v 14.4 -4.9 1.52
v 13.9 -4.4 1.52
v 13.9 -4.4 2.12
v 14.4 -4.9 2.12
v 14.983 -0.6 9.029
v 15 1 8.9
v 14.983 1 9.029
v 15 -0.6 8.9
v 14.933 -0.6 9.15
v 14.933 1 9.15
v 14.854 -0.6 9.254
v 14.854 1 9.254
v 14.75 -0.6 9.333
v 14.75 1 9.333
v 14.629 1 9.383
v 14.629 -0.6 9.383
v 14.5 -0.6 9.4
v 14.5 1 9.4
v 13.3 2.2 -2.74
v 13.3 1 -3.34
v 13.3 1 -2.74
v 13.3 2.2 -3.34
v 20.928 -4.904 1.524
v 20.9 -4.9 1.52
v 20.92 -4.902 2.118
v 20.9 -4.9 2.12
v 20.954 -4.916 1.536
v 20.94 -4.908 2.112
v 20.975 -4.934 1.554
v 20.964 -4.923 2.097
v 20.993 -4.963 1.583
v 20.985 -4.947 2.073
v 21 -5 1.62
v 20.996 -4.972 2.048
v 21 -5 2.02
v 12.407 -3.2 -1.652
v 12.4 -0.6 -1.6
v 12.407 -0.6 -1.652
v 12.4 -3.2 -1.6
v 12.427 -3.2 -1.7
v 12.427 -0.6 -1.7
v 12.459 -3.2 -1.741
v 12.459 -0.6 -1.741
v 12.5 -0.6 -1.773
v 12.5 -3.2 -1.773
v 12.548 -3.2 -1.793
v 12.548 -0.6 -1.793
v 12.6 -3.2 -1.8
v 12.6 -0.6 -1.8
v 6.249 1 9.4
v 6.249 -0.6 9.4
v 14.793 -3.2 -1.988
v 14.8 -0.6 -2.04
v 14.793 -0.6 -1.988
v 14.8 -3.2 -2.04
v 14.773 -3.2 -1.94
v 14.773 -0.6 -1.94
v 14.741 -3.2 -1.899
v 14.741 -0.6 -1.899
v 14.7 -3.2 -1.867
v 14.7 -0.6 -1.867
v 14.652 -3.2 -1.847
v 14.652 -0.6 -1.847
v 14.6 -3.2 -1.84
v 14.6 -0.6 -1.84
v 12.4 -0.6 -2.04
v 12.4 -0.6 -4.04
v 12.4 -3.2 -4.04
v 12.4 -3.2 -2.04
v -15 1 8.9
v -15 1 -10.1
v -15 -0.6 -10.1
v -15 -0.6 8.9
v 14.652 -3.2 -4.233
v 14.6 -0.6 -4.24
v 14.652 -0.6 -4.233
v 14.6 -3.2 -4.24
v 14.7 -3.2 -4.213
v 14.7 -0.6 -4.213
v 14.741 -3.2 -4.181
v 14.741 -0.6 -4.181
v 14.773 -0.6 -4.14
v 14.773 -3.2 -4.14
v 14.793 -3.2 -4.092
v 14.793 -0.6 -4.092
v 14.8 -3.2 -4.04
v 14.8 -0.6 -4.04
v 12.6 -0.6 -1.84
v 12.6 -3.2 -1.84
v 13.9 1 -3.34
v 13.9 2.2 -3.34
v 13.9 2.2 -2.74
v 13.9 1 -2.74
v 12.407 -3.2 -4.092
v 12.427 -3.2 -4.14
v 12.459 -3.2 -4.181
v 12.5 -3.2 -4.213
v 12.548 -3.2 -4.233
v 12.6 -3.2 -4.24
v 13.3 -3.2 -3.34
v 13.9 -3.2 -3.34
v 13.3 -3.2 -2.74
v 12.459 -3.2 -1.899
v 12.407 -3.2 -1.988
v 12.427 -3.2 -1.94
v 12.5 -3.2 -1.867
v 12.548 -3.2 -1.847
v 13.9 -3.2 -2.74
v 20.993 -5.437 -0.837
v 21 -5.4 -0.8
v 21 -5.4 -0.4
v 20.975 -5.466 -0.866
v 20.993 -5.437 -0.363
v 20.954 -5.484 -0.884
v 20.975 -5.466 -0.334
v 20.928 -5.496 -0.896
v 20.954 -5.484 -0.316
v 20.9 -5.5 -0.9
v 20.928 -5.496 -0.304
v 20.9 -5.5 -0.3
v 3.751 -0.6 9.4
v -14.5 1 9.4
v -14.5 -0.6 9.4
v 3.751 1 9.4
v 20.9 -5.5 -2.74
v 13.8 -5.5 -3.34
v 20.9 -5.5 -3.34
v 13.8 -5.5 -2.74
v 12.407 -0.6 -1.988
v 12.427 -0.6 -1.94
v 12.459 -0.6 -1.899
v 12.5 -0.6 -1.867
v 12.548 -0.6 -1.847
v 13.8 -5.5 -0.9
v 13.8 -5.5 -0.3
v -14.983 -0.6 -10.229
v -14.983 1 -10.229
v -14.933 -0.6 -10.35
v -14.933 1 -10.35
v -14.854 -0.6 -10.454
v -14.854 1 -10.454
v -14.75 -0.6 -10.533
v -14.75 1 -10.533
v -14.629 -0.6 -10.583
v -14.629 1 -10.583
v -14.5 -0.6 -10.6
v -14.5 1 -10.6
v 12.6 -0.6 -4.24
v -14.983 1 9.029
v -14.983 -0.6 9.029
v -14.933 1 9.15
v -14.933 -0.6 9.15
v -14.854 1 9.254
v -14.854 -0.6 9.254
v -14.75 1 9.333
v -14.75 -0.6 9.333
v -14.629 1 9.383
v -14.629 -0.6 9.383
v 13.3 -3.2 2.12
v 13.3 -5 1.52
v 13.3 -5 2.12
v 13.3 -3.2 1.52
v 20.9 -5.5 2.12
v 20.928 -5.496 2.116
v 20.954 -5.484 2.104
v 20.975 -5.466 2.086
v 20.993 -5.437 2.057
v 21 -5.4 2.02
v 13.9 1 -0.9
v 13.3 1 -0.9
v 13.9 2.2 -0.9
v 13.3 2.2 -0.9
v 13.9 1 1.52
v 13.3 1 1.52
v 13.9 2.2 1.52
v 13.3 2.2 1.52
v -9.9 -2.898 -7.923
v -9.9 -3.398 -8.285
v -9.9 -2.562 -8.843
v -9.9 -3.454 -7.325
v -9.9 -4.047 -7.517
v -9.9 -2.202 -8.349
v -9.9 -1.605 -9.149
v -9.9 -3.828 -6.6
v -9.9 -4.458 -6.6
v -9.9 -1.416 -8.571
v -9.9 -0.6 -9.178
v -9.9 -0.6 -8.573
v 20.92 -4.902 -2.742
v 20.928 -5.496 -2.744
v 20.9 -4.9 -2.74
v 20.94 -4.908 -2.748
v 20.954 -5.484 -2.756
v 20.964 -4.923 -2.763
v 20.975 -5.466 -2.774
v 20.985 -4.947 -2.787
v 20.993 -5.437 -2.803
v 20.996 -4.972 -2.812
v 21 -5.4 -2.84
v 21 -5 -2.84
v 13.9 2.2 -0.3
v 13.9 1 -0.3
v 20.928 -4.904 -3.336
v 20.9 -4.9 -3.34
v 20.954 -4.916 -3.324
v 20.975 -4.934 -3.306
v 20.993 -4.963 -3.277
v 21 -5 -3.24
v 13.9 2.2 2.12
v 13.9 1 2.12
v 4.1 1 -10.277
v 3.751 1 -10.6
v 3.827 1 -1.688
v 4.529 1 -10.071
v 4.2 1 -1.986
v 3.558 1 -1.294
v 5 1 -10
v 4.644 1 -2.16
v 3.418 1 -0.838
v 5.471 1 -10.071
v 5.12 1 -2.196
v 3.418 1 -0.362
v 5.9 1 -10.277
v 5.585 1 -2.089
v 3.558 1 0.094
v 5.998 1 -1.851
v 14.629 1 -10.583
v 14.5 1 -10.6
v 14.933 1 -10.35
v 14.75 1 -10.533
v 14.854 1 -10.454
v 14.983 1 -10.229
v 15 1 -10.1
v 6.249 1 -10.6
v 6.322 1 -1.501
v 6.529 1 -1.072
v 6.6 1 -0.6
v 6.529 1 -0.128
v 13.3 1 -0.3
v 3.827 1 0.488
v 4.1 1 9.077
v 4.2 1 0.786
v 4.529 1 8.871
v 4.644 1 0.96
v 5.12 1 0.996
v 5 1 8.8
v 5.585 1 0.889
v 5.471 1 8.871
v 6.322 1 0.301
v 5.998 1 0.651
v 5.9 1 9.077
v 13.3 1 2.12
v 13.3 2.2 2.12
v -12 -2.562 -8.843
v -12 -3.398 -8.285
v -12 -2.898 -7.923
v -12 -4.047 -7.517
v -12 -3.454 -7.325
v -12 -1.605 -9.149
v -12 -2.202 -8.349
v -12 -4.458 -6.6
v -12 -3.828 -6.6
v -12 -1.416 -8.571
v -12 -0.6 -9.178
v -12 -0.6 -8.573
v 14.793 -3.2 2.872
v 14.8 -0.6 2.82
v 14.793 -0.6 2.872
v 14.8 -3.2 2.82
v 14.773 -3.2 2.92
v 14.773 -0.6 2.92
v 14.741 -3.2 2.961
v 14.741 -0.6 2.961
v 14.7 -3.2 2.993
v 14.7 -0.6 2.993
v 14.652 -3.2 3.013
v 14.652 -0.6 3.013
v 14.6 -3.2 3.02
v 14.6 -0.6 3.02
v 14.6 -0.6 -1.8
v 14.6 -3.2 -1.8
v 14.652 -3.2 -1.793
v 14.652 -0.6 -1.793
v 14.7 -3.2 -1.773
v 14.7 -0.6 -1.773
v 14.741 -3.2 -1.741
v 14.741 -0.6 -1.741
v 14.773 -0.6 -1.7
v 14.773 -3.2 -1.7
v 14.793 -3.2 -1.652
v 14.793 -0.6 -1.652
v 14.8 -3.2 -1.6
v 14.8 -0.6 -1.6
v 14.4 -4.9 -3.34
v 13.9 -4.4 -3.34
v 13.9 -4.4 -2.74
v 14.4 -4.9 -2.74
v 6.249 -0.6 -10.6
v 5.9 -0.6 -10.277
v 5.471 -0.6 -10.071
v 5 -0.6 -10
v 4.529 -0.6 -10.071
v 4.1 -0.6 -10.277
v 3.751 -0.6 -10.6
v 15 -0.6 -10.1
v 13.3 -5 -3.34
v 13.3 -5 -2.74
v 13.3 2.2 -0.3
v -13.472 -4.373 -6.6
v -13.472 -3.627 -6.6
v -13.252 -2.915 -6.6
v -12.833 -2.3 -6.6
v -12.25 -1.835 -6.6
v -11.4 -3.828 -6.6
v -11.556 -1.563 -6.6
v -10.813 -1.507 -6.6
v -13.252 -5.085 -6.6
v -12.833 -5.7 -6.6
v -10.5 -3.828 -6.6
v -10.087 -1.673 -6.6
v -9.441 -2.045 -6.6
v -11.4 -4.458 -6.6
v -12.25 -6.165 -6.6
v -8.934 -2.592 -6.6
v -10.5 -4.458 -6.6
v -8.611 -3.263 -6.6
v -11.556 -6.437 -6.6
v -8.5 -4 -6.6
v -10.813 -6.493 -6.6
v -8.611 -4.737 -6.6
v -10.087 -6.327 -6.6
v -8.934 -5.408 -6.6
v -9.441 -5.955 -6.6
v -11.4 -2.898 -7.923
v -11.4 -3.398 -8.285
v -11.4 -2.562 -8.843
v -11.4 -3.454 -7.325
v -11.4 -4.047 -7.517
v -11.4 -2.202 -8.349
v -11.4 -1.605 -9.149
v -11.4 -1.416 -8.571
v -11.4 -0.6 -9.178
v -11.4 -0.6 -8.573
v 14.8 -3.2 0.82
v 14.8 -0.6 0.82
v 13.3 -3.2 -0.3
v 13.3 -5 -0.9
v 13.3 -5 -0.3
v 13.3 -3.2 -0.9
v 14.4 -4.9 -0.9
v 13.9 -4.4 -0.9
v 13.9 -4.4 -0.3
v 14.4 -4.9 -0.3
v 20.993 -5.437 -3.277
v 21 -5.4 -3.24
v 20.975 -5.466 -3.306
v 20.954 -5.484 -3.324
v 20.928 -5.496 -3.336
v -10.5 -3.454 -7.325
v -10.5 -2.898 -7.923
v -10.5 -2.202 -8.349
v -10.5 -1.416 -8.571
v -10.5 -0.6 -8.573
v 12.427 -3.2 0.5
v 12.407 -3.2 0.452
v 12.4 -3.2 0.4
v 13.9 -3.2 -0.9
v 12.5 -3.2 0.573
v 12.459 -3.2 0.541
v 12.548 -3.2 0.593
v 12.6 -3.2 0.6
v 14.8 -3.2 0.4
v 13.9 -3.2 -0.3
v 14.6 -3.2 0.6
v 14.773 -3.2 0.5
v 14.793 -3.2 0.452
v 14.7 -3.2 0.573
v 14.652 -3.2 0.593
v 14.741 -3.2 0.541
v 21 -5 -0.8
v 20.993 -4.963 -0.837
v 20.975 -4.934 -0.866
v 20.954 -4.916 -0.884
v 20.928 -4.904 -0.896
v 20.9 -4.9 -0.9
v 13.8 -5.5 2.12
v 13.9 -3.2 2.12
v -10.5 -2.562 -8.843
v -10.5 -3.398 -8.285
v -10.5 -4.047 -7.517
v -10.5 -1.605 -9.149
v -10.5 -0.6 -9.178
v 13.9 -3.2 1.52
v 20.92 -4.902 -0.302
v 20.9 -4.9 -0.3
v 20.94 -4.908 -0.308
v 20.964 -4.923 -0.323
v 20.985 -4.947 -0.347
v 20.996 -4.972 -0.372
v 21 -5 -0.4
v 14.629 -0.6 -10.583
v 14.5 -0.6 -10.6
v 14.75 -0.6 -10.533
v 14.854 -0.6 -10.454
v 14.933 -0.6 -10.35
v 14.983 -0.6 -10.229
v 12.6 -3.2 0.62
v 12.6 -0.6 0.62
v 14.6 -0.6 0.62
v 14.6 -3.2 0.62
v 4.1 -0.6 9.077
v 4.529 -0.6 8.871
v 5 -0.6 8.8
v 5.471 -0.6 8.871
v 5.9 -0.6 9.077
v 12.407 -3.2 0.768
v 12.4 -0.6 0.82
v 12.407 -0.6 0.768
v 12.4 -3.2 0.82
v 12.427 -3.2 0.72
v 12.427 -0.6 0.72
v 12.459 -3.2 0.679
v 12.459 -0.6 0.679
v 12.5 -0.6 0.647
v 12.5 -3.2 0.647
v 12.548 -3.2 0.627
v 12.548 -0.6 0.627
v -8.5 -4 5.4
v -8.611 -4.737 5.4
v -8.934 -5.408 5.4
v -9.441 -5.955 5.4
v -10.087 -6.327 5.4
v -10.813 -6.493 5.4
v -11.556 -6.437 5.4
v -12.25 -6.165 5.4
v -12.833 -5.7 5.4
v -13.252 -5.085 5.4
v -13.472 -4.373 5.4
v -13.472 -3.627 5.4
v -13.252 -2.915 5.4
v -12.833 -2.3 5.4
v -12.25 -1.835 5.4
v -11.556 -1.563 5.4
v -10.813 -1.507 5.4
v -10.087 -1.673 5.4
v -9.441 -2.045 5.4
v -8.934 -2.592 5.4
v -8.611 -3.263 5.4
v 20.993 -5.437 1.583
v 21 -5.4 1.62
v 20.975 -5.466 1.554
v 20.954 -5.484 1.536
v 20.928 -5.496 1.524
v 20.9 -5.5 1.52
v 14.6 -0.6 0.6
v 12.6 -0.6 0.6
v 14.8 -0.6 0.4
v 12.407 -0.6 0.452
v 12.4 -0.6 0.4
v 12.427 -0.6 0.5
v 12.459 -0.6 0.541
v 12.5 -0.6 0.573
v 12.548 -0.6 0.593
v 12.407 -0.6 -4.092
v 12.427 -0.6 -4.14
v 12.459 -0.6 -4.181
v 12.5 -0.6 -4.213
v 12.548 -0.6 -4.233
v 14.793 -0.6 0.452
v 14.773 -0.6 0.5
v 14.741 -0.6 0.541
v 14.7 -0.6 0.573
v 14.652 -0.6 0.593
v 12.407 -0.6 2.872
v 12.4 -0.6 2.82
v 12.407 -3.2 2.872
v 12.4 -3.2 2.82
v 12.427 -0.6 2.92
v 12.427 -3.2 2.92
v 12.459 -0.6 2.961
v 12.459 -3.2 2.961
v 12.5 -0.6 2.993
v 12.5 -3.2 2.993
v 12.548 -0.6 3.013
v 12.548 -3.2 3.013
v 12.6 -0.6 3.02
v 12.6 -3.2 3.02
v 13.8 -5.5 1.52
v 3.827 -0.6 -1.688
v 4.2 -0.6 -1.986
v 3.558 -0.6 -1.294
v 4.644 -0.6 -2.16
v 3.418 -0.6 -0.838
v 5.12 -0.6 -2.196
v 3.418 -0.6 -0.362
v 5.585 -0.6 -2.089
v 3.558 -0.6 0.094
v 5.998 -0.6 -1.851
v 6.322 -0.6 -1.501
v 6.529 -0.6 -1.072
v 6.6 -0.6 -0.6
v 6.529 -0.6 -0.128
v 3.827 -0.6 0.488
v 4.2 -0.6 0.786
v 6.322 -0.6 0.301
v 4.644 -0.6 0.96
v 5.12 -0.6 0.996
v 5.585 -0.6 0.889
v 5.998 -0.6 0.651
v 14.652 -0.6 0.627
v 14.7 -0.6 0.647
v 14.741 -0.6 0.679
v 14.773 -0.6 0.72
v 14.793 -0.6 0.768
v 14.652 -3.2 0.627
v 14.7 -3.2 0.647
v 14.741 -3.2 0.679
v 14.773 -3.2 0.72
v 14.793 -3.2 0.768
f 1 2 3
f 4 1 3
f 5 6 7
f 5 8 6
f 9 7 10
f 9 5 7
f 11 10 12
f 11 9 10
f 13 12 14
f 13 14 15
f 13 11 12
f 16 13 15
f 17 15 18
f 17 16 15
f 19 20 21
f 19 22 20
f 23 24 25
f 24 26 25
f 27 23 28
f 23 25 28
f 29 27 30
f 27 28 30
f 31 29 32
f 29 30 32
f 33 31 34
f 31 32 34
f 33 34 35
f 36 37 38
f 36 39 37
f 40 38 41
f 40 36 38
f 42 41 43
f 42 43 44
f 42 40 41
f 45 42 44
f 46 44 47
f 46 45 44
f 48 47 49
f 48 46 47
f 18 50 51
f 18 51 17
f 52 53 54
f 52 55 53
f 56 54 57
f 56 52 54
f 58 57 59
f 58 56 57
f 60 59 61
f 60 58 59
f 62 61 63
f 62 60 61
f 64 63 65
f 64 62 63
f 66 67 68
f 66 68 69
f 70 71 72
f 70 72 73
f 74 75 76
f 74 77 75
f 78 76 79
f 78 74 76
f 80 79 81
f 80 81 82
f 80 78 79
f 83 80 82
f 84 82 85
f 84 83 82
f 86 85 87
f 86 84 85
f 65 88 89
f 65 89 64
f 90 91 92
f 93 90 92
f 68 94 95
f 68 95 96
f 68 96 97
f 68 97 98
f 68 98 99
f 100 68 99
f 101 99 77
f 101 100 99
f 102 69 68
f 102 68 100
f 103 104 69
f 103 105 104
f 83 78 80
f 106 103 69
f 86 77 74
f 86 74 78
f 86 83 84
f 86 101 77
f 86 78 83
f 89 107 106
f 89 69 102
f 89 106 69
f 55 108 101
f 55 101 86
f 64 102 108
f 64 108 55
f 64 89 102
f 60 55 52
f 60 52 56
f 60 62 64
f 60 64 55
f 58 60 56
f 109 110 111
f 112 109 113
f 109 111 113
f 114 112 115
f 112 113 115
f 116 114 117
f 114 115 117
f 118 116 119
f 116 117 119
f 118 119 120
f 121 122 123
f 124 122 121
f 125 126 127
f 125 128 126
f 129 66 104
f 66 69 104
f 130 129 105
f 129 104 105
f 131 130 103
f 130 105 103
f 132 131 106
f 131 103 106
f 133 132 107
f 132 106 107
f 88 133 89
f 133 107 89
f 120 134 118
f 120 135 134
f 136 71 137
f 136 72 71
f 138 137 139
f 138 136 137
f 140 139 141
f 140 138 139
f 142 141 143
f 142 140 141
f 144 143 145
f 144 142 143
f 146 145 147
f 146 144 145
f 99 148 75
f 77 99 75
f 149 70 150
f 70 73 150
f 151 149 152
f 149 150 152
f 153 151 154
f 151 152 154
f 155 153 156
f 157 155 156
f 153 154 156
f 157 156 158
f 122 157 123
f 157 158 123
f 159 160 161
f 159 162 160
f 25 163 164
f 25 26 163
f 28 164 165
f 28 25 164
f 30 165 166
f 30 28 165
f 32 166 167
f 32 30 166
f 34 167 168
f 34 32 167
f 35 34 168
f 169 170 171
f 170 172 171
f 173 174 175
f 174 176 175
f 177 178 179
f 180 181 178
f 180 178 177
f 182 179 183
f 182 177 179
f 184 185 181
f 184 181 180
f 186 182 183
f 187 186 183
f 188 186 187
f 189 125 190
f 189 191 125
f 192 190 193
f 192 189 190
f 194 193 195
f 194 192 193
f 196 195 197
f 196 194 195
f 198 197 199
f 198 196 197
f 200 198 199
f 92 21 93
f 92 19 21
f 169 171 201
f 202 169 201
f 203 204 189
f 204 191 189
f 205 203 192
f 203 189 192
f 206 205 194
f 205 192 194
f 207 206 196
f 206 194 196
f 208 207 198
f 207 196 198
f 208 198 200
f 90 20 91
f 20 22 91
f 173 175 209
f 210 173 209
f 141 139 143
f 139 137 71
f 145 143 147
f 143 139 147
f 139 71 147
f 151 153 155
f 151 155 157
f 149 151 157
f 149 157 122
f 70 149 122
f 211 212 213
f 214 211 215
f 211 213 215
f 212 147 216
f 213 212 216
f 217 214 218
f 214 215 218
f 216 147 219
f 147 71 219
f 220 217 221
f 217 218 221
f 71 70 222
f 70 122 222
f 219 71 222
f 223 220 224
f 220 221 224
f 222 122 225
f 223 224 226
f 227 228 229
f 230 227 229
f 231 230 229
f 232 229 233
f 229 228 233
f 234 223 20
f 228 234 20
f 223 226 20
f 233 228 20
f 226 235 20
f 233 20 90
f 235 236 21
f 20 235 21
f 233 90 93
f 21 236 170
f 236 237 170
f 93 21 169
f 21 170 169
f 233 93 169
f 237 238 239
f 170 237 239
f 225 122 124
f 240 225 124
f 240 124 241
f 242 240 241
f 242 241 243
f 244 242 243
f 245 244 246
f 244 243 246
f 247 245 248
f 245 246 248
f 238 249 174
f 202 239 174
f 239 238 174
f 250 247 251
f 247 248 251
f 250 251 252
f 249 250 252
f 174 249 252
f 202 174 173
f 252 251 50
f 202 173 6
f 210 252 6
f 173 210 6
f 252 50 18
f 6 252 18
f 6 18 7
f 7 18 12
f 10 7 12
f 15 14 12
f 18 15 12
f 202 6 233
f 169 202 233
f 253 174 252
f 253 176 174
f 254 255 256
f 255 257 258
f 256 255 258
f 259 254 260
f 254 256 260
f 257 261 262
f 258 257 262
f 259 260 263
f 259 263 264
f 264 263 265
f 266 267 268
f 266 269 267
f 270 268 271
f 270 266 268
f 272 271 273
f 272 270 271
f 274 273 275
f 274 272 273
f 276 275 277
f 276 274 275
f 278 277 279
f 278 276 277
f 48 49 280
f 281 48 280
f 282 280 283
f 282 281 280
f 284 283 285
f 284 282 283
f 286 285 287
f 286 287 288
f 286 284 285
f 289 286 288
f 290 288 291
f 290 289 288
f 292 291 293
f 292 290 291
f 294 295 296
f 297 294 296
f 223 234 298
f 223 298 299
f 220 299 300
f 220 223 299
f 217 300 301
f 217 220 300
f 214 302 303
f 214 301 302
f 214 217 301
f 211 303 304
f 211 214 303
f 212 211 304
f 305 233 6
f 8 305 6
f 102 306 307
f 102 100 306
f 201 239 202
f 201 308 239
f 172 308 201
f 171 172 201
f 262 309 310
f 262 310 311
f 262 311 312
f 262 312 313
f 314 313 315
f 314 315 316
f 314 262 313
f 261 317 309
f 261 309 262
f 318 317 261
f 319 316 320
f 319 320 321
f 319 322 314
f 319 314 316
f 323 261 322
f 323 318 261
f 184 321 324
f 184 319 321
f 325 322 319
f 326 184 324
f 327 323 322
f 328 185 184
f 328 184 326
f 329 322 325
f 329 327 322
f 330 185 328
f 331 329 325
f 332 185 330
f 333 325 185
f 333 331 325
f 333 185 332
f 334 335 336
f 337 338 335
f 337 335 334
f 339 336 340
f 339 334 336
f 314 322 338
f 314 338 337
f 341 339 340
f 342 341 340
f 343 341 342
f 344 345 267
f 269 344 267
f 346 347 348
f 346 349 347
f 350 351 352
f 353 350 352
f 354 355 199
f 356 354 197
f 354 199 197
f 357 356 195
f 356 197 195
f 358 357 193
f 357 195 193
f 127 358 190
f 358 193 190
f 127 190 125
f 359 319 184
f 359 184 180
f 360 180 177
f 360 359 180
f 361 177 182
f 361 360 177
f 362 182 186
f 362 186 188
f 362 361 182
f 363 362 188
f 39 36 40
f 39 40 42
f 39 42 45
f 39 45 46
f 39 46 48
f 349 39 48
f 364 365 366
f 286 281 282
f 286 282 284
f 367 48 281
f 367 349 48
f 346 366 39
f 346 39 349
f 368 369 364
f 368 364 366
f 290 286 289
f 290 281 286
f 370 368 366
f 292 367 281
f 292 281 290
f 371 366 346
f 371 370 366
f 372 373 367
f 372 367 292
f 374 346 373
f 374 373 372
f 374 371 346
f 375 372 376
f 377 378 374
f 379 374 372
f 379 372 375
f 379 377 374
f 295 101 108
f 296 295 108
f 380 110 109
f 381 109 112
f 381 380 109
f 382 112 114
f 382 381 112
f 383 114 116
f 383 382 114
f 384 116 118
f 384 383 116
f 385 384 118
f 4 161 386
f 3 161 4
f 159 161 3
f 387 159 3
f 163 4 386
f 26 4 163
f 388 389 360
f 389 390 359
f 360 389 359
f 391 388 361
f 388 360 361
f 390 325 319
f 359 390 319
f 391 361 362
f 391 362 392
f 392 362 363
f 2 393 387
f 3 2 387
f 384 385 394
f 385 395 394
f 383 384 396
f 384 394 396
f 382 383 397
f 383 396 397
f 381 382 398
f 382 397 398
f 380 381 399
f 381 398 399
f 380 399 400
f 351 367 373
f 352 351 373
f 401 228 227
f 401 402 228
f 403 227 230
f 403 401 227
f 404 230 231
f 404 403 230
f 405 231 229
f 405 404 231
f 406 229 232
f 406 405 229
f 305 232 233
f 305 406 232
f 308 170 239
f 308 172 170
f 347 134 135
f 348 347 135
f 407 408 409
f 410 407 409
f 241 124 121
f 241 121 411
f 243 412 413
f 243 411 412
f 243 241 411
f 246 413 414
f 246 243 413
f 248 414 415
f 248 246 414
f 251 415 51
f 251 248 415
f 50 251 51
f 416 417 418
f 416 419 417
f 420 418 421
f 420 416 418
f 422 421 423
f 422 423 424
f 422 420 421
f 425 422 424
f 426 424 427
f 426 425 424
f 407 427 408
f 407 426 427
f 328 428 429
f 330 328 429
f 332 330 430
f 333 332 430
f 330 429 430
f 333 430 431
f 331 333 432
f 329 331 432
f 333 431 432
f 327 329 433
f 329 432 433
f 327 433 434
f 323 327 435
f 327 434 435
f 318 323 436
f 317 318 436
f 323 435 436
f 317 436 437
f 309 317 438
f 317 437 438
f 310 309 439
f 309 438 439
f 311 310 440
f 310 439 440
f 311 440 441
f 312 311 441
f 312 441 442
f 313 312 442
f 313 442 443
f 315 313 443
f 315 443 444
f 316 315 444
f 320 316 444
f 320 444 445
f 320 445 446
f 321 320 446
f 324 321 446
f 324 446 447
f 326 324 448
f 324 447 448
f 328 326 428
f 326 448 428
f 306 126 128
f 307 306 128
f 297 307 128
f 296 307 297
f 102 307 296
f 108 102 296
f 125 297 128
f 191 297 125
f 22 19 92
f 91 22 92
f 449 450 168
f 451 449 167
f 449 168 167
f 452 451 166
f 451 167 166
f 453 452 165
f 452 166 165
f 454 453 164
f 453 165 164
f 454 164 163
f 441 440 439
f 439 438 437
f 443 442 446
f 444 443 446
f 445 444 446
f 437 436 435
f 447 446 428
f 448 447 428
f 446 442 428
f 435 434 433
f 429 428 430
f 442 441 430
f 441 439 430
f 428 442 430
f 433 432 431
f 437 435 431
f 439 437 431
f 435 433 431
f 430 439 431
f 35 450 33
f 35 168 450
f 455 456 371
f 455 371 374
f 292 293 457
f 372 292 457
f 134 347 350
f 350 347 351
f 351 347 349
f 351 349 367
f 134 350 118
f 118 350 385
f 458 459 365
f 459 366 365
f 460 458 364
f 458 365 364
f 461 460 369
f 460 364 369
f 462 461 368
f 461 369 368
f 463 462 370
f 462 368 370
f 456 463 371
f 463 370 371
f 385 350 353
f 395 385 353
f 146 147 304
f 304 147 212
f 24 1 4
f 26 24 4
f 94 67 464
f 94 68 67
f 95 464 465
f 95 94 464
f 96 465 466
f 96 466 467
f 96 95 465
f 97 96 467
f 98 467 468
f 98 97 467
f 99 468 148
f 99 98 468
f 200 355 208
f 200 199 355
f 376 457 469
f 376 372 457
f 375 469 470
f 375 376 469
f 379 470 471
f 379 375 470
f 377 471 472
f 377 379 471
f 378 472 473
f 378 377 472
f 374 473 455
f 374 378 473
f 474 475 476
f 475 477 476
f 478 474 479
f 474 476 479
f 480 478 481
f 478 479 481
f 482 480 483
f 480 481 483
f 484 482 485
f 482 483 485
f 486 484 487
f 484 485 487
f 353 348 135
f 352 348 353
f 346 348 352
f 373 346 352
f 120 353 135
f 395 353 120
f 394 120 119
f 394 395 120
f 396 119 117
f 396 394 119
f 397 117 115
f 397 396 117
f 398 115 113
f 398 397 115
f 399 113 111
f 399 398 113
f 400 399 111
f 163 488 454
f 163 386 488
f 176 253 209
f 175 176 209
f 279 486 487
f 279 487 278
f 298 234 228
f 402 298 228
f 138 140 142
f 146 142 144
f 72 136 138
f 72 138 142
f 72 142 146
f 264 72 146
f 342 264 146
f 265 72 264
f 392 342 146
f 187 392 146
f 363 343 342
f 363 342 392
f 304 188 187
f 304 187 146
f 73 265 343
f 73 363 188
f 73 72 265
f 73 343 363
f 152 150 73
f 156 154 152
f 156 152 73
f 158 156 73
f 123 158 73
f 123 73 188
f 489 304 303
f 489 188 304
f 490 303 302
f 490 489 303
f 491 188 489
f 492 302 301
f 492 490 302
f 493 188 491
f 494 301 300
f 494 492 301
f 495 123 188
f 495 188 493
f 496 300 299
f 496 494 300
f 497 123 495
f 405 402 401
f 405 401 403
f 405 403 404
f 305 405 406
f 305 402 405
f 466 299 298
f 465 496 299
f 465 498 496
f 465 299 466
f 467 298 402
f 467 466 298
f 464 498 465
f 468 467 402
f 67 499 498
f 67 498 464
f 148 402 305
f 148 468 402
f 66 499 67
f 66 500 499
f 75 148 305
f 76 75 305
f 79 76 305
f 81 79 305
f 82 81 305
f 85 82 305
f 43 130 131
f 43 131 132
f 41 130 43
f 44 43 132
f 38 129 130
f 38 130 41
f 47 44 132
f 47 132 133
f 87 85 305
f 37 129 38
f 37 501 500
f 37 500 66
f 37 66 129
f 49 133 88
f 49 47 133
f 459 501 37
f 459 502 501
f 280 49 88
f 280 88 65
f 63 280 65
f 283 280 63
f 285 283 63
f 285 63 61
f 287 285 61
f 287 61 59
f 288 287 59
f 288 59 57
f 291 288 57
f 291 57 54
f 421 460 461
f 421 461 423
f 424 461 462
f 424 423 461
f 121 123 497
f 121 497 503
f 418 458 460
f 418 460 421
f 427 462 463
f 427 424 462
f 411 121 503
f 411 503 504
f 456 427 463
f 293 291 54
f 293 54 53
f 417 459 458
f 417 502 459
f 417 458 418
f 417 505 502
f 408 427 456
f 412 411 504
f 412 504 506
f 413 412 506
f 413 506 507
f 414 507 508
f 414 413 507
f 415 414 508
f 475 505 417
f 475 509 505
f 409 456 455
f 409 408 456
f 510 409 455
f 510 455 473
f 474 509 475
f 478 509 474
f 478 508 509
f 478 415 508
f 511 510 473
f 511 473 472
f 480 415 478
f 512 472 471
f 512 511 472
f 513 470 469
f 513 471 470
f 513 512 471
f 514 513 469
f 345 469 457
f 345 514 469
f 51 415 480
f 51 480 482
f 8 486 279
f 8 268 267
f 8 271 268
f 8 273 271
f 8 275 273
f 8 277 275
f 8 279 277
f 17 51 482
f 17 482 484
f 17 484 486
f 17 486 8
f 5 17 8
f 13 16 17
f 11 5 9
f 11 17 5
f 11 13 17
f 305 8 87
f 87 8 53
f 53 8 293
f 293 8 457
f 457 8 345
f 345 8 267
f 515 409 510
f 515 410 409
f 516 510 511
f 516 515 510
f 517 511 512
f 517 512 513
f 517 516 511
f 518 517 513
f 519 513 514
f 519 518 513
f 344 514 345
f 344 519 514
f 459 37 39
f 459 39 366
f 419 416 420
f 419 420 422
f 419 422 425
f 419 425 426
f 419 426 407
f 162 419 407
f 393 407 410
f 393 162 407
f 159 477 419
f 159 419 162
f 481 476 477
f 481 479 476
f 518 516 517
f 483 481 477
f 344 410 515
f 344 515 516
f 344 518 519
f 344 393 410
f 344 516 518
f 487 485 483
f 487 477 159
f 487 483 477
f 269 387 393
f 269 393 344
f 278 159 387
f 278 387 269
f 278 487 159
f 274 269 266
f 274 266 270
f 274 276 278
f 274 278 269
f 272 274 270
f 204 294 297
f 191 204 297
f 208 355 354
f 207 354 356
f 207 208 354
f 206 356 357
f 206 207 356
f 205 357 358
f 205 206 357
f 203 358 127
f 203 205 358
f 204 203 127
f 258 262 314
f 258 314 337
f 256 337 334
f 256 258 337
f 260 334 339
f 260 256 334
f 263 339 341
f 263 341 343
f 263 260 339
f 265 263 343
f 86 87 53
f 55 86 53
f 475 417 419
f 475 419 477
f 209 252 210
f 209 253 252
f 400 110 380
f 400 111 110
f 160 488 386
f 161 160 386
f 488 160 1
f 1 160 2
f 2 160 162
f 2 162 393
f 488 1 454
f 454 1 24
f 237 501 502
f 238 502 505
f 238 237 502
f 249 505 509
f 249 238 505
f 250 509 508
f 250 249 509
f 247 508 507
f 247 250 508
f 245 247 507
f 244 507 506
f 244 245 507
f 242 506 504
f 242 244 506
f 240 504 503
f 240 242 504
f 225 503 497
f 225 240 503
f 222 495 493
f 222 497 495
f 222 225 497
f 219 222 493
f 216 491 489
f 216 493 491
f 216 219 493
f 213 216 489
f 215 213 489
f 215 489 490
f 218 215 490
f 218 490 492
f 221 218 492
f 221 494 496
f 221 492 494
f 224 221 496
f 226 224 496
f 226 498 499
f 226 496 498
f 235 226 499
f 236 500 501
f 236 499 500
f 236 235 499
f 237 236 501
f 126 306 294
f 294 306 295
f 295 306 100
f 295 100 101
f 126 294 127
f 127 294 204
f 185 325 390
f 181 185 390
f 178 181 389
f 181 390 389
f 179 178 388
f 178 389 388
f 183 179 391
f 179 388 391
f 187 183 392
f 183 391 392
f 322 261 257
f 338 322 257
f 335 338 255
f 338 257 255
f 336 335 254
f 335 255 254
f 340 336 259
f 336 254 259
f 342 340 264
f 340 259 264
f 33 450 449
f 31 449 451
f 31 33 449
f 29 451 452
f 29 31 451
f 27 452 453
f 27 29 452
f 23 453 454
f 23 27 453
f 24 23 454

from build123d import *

# Parameters (mm, degrees)
BOX214_W                  = 0.6
BOX214_H                  = 0.6
BOX214_DEPTH              = 7.7
BOX213_W                  = 0.6
BOX213_H                  = 0.6
BOX213_DEPTH              = 7.7
CHAMFER002_SIZE           = 0.5
CHAMFER003_SIZE           = 0.5
FILLET164_R               = 0.1
BOX212_W                  = 2.4
BOX212_H                  = 2.4
BOX212_DEPTH              = 2.6
FILLET163_R               = 0.2
BOX217_W                  = 0.6
BOX217_H                  = 0.6
BOX217_DEPTH              = 7.7
BOX216_W                  = 0.6
BOX216_H                  = 0.6
BOX216_DEPTH              = 7.7
CHAMFER004_SIZE           = 0.5
CHAMFER005_SIZE           = 0.5
FILLET166_R               = 0.1
BOX215_W                  = 2.4
BOX215_H                  = 2.4
BOX215_DEPTH              = 2.6
FILLET165_R               = 0.2
BOX220_W                  = 0.6
BOX220_H                  = 0.6
BOX220_DEPTH              = 7.7
BOX219_W                  = 0.6
BOX219_H                  = 0.6
BOX219_DEPTH              = 7.7
CHAMFER006_SIZE           = 0.5
CHAMFER007_SIZE           = 0.5
FILLET168_R               = 0.1
BOX218_W                  = 2.4
BOX218_H                  = 2.4
BOX218_DEPTH              = 2.6
FILLET167_R               = 0.2
BOX221_W                  = 10
BOX221_H                  = 10
BOX221_DEPTH              = 10
BOX222_W                  = 10
BOX222_H                  = 10
BOX222_DEPTH              = 10
TUBE003_R                 = 3.6
TUBE003_R_2               = 3
TUBE003_DEPTH             = 0.6
TUBE004_R                 = 3.6
TUBE004_R_2               = 3
TUBE004_DEPTH             = 0.6
CYLINDER193_R             = 2
CYLINDER193_DEPTH         = 1
CYLINDER194_R             = 2
CYLINDER194_DEPTH         = 1
CYLINDER192_R             = 2.5
CYLINDER192_DEPTH         = 12
FUSION007_PLACEMENT_ANGLE = 90
CYLINDER191_R             = 1.6
CYLINDER191_DEPTH         = 10
CYLINDER001_R             = 1.6
CYLINDER001_DEPTH         = 10
CYLINDER190_R             = 1.6
CYLINDER190_DEPTH         = 10
BOX211_W                  = 30
BOX211_H                  = 20
BOX211_DEPTH              = 1.6
FILLET161_R               = 0.5
FILLET162_R               = 0.5
FUSION010_PLACEMENT_ANGLE = 90


with BuildPart() as cubo201:
    # Box214 → Box214 (new body)
    with BuildSketch(Plane(origin=(0, 0, 7.7), x_dir=(0, 0, -1), z_dir=(1, 0, 0))):
        with Locations((0.3, 0.3)):
            Rectangle(BOX214_W, BOX214_H)
    extrude(amount=BOX214_DEPTH)


with BuildPart() as cuerpometal:
    # Box213 → Box213 (new body)
    with BuildSketch(Plane.XY):
        with Locations((0.3, 0.3)):
            Rectangle(BOX213_W, BOX213_H)
    extrude(amount=BOX213_DEPTH)

    # Fusion139: union Cubo201
    add(cubo201.part)

    # Chamfer002
    chamfer002_edges = [cuerpometal.edges().sort_by_distance(p)[0] for p in [
        (0, 0.3, 7.7),
    ]]
    chamfer(chamfer002_edges, length=CHAMFER002_SIZE)

    # Chamfer003
    chamfer003_edges = [cuerpometal.edges().sort_by_distance(p)[0] for p in [
        (0.6, 0.3, 7.1),
    ]]
    chamfer(chamfer003_edges, length=CHAMFER003_SIZE)

    # Fillet164
    fillet164_edges = [cuerpometal.edges().sort_by_distance(p)[0] for p in [
        (7.7, 0, 7.4),
        (7.7, 0.3, 7.1),
        (7.7, 0.3, 7.7),
        (7.7, 0.6, 7.4),
    ]]
    fillet(fillet164_edges, radius=FILLET164_R)


with BuildPart() as cuerpometal_1:
    # Fillet164 placement: moved
    add(cuerpometal.part.moved(Location((0.9, 0.9, -1.2))))


with BuildPart() as conectormacho:
    # Box212 → Box212 (new body)
    with BuildSketch(Plane.XY.offset(1.6)):
        with Locations((1.2, 1.2)):
            Rectangle(BOX212_W, BOX212_H)
    extrude(amount=BOX212_DEPTH)

    # Fillet163
    fillet163_edges = [conectormacho.edges().sort_by_distance(p)[0] for p in [
        (0, 0, 2.9),
        (0, 2.4, 2.9),
        (2.4, 0, 2.9),
        (2.4, 2.4, 2.9),
    ]]
    fillet(fillet163_edges, radius=FILLET163_R)

    # Fusion001: union CuerpoMetal
    add(cuerpometal_1.part)


with BuildPart() as conectormacho_1:
    # Fusion001 placement: moved
    add(conectormacho.part.moved(Location((12.4, -1.2, 0))))


with BuildPart() as cubo204:
    # Box217 → Box217 (new body)
    with BuildSketch(Plane(origin=(0, 0, 7.7), x_dir=(0, 0, -1), z_dir=(1, 0, 0))):
        with Locations((0.3, 0.3)):
            Rectangle(BOX217_W, BOX217_H)
    extrude(amount=BOX217_DEPTH)


with BuildPart() as cuerpometal001:
    # Box216 → Box216 (new body)
    with BuildSketch(Plane.XY):
        with Locations((0.3, 0.3)):
            Rectangle(BOX216_W, BOX216_H)
    extrude(amount=BOX216_DEPTH)

    # Fusion140: union Cubo204
    add(cubo204.part)

    # Chamfer004
    chamfer004_edges = [cuerpometal001.edges().sort_by_distance(p)[0] for p in [
        (0, 0.3, 7.7),
    ]]
    chamfer(chamfer004_edges, length=CHAMFER004_SIZE)

    # Chamfer005
    chamfer005_edges = [cuerpometal001.edges().sort_by_distance(p)[0] for p in [
        (0.6, 0.3, 7.1),
    ]]
    chamfer(chamfer005_edges, length=CHAMFER005_SIZE)

    # Fillet166
    fillet166_edges = [cuerpometal001.edges().sort_by_distance(p)[0] for p in [
        (7.7, 0, 7.4),
        (7.7, 0.3, 7.1),
        (7.7, 0.3, 7.7),
        (7.7, 0.6, 7.4),
    ]]
    fillet(fillet166_edges, radius=FILLET166_R)


with BuildPart() as cuerpometal001_1:
    # Fillet166 placement: moved
    add(cuerpometal001.part.moved(Location((0.9, 0.9, -1.2))))


with BuildPart() as conectormacho001:
    # Box215 → Box215 (new body)
    with BuildSketch(Plane.XY.offset(1.6)):
        with Locations((1.2, 1.2)):
            Rectangle(BOX215_W, BOX215_H)
    extrude(amount=BOX215_DEPTH)

    # Fillet165
    fillet165_edges = [conectormacho001.edges().sort_by_distance(p)[0] for p in [
        (0, 0, 2.9),
        (0, 2.4, 2.9),
        (2.4, 0, 2.9),
        (2.4, 2.4, 2.9),
    ]]
    fillet(fillet165_edges, radius=FILLET165_R)

    # Fusion003: union CuerpoMetal001
    add(cuerpometal001_1.part)


with BuildPart() as conectormacho001_1:
    # Fusion003 placement: moved
    add(conectormacho001.part.moved(Location((12.4, 1.22, 0))))


with BuildPart() as cubo207:
    # Box220 → Box220 (new body)
    with BuildSketch(Plane(origin=(0, 0, 7.7), x_dir=(0, 0, -1), z_dir=(1, 0, 0))):
        with Locations((0.3, 0.3)):
            Rectangle(BOX220_W, BOX220_H)
    extrude(amount=BOX220_DEPTH)


with BuildPart() as cuerpometal002:
    # Box219 → Box219 (new body)
    with BuildSketch(Plane.XY):
        with Locations((0.3, 0.3)):
            Rectangle(BOX219_W, BOX219_H)
    extrude(amount=BOX219_DEPTH)

    # Fusion004: union Cubo207
    add(cubo207.part)

    # Chamfer006
    chamfer006_edges = [cuerpometal002.edges().sort_by_distance(p)[0] for p in [
        (0, 0.3, 7.7),
    ]]
    chamfer(chamfer006_edges, length=CHAMFER006_SIZE)

    # Chamfer007
    chamfer007_edges = [cuerpometal002.edges().sort_by_distance(p)[0] for p in [
        (0.6, 0.3, 7.1),
    ]]
    chamfer(chamfer007_edges, length=CHAMFER007_SIZE)

    # Fillet168
    fillet168_edges = [cuerpometal002.edges().sort_by_distance(p)[0] for p in [
        (7.7, 0, 7.4),
        (7.7, 0.3, 7.1),
        (7.7, 0.3, 7.7),
        (7.7, 0.6, 7.4),
    ]]
    fillet(fillet168_edges, radius=FILLET168_R)


with BuildPart() as cuerpometal002_1:
    # Fillet168 placement: moved
    add(cuerpometal002.part.moved(Location((0.9, 0.9, -1.2))))


with BuildPart() as conectormacho002:
    # Box218 → Box218 (new body)
    with BuildSketch(Plane.XY.offset(1.6)):
        with Locations((1.2, 1.2)):
            Rectangle(BOX218_W, BOX218_H)
    extrude(amount=BOX218_DEPTH)

    # Fillet167
    fillet167_edges = [conectormacho002.edges().sort_by_distance(p)[0] for p in [
        (0, 0, 2.9),
        (0, 2.4, 2.9),
        (2.4, 0, 2.9),
        (2.4, 2.4, 2.9),
    ]]
    fillet(fillet167_edges, radius=FILLET167_R)

    # Fusion005: union CuerpoMetal002
    add(cuerpometal002_1.part)


with BuildPart() as conectormacho002_1:
    # Fusion005 placement: moved
    add(conectormacho002.part.moved(Location((12.4, -3.64, 0))))


with BuildPart() as cubo208:
    # Box221 → Box221 (new body)
    with BuildSketch(Plane(origin=(-14, -6, 0), x_dir=(1, 0, 0), z_dir=(0, 0, 1))):
        with Locations((5, 5)):
            Rectangle(BOX221_W, BOX221_H)
    extrude(amount=BOX221_DEPTH)


with BuildPart() as cubo011:
    # Box222 → Box222 (new body)
    with BuildSketch(Plane(origin=(-14, -11, -10), x_dir=(1, 0, 0), z_dir=(0, 0, 1))):
        with Locations((5, 5)):
            Rectangle(BOX222_W, BOX222_H)
    extrude(amount=BOX222_DEPTH)


with BuildPart() as tube003:
    # Tube003 → Tube003 (new body)
    with BuildSketch(Plane(origin=(-12, -5, 2), x_dir=(0, 0, -1), z_dir=(1, 0, 0))):
        Circle(TUBE003_R)
        Circle(TUBE003_R_2, mode=Mode.SUBTRACT)
    extrude(amount=TUBE003_DEPTH)


with BuildPart() as sensor:
    # Tube004 → Tube004 (new body)
    with BuildSketch(Plane(origin=(-10.5, -5, 2), x_dir=(0, 0, -1), z_dir=(1, 0, 0))):
        Circle(TUBE004_R)
        Circle(TUBE004_R_2, mode=Mode.SUBTRACT)
    extrude(amount=TUBE004_DEPTH)

    # Fusion008: union Tube003
    add(tube003.part)

    # Cut262: cut Cubo011
    add(cubo011.part, mode=Mode.SUBTRACT)

    # Cut263: cut Cubo208
    add(cubo208.part, mode=Mode.SUBTRACT)


with BuildPart() as cilindro193:
    # Cylinder193 → Cylinder193 (new body)
    with BuildSketch(Plane.XY):
        Circle(CYLINDER193_R)
    extrude(amount=CYLINDER193_DEPTH)


with BuildPart() as cilindro194:
    # Cylinder194 → Cylinder194 (new body)
    with BuildSketch(Plane.XY.offset(11)):
        Circle(CYLINDER194_R)
    extrude(amount=CYLINDER194_DEPTH)


with BuildPart() as fusion009:
    # Cylinder192 → Cylinder192 (new body)
    with BuildSketch(Plane.XY):
        Circle(CYLINDER192_R)
    extrude(amount=CYLINDER192_DEPTH)

    # Fusion006: union Cilindro194
    add(cilindro194.part)

    # Fusion007: union Cilindro193
    add(cilindro193.part)


with BuildPart() as fusion009_1:
    # Fusion007 placement: moved
    add(fusion009.part.moved(Location((-11, 6, 5))).rotate(Axis((-11, 6, 5), (1, 0, 0)), FUSION007_PLACEMENT_ANGLE))

    # Fusion009: union Sensor
    add(sensor.part)


with BuildPart() as cilindro191:
    # Cylinder191 → Cylinder191 (new body)
    with BuildSketch(Plane(origin=(5, 11, 0), x_dir=(1, 0, 0), z_dir=(0, 0, 1))):
        Circle(CYLINDER191_R)
    extrude(amount=CYLINDER191_DEPTH)


with BuildPart() as cilindro001:
    # Cylinder001 → Cylinder001 (new body)
    with BuildSketch(Plane(origin=(5, -11, 0), x_dir=(1, 0, 0), z_dir=(0, 0, 1))):
        Circle(CYLINDER001_R)
    extrude(amount=CYLINDER001_DEPTH)


with BuildPart() as cilindro190:
    # Cylinder190 → Cylinder190 (new body)
    with BuildSketch(Plane(origin=(5, 0, 0), x_dir=(1, 0, 0), z_dir=(0, 0, 1))):
        Circle(CYLINDER190_R)
    extrude(amount=CYLINDER190_DEPTH)


with BuildPart() as sensor_inclinaci_n:
    # Box211 → Box211 (new body)
    with BuildSketch(Plane.XY):
        with Locations((15, 10)):
            Rectangle(BOX211_W, BOX211_H)
    extrude(amount=BOX211_DEPTH)

    # Fillet161
    fillet161_edges = [sensor_inclinaci_n.edges().sort_by_distance(p)[0] for p in [
        (0, 0, 0.8),
        (0, 20, 0.8),
        (30, 20, 0.8),
    ]]
    fillet(fillet161_edges, radius=FILLET161_R)

    # Fillet162
    fillet162_edges = [sensor_inclinaci_n.edges().sort_by_distance(p)[0] for p in [
        (30, 0, 0.8),
    ]]
    fillet(fillet162_edges, radius=FILLET162_R)


with BuildPart() as sensor_inclinaci_n_1:
    # Fillet162 placement: moved
    add(sensor_inclinaci_n.part.moved(Location((-15, -10, 0))))

    # Cut259: cut Cilindro190
    add(cilindro190.part, mode=Mode.SUBTRACT)

    # Cut260: cut Cilindro001
    add(cilindro001.part, mode=Mode.SUBTRACT)

    # Cut261: cut Cilindro191
    add(cilindro191.part, mode=Mode.SUBTRACT)

    # Fusion010: union ConectorMacho, ConectorMacho001, ConectorMacho002, Fusion009
    add(conectormacho_1.part)
    add(conectormacho001_1.part)
    add(conectormacho002_1.part)
    add(fusion009_1.part)


with BuildPart() as sensor_inclinaci_n_2:
    # Fusion010 placement: moved
    add(sensor_inclinaci_n_1.part.moved(Location((0, 1, -0.6))).rotate(Axis((0, 1, -0.6), (1, 0, 0)), FUSION010_PLACEMENT_ANGLE))


solid = sensor_inclinaci_n_2.part
